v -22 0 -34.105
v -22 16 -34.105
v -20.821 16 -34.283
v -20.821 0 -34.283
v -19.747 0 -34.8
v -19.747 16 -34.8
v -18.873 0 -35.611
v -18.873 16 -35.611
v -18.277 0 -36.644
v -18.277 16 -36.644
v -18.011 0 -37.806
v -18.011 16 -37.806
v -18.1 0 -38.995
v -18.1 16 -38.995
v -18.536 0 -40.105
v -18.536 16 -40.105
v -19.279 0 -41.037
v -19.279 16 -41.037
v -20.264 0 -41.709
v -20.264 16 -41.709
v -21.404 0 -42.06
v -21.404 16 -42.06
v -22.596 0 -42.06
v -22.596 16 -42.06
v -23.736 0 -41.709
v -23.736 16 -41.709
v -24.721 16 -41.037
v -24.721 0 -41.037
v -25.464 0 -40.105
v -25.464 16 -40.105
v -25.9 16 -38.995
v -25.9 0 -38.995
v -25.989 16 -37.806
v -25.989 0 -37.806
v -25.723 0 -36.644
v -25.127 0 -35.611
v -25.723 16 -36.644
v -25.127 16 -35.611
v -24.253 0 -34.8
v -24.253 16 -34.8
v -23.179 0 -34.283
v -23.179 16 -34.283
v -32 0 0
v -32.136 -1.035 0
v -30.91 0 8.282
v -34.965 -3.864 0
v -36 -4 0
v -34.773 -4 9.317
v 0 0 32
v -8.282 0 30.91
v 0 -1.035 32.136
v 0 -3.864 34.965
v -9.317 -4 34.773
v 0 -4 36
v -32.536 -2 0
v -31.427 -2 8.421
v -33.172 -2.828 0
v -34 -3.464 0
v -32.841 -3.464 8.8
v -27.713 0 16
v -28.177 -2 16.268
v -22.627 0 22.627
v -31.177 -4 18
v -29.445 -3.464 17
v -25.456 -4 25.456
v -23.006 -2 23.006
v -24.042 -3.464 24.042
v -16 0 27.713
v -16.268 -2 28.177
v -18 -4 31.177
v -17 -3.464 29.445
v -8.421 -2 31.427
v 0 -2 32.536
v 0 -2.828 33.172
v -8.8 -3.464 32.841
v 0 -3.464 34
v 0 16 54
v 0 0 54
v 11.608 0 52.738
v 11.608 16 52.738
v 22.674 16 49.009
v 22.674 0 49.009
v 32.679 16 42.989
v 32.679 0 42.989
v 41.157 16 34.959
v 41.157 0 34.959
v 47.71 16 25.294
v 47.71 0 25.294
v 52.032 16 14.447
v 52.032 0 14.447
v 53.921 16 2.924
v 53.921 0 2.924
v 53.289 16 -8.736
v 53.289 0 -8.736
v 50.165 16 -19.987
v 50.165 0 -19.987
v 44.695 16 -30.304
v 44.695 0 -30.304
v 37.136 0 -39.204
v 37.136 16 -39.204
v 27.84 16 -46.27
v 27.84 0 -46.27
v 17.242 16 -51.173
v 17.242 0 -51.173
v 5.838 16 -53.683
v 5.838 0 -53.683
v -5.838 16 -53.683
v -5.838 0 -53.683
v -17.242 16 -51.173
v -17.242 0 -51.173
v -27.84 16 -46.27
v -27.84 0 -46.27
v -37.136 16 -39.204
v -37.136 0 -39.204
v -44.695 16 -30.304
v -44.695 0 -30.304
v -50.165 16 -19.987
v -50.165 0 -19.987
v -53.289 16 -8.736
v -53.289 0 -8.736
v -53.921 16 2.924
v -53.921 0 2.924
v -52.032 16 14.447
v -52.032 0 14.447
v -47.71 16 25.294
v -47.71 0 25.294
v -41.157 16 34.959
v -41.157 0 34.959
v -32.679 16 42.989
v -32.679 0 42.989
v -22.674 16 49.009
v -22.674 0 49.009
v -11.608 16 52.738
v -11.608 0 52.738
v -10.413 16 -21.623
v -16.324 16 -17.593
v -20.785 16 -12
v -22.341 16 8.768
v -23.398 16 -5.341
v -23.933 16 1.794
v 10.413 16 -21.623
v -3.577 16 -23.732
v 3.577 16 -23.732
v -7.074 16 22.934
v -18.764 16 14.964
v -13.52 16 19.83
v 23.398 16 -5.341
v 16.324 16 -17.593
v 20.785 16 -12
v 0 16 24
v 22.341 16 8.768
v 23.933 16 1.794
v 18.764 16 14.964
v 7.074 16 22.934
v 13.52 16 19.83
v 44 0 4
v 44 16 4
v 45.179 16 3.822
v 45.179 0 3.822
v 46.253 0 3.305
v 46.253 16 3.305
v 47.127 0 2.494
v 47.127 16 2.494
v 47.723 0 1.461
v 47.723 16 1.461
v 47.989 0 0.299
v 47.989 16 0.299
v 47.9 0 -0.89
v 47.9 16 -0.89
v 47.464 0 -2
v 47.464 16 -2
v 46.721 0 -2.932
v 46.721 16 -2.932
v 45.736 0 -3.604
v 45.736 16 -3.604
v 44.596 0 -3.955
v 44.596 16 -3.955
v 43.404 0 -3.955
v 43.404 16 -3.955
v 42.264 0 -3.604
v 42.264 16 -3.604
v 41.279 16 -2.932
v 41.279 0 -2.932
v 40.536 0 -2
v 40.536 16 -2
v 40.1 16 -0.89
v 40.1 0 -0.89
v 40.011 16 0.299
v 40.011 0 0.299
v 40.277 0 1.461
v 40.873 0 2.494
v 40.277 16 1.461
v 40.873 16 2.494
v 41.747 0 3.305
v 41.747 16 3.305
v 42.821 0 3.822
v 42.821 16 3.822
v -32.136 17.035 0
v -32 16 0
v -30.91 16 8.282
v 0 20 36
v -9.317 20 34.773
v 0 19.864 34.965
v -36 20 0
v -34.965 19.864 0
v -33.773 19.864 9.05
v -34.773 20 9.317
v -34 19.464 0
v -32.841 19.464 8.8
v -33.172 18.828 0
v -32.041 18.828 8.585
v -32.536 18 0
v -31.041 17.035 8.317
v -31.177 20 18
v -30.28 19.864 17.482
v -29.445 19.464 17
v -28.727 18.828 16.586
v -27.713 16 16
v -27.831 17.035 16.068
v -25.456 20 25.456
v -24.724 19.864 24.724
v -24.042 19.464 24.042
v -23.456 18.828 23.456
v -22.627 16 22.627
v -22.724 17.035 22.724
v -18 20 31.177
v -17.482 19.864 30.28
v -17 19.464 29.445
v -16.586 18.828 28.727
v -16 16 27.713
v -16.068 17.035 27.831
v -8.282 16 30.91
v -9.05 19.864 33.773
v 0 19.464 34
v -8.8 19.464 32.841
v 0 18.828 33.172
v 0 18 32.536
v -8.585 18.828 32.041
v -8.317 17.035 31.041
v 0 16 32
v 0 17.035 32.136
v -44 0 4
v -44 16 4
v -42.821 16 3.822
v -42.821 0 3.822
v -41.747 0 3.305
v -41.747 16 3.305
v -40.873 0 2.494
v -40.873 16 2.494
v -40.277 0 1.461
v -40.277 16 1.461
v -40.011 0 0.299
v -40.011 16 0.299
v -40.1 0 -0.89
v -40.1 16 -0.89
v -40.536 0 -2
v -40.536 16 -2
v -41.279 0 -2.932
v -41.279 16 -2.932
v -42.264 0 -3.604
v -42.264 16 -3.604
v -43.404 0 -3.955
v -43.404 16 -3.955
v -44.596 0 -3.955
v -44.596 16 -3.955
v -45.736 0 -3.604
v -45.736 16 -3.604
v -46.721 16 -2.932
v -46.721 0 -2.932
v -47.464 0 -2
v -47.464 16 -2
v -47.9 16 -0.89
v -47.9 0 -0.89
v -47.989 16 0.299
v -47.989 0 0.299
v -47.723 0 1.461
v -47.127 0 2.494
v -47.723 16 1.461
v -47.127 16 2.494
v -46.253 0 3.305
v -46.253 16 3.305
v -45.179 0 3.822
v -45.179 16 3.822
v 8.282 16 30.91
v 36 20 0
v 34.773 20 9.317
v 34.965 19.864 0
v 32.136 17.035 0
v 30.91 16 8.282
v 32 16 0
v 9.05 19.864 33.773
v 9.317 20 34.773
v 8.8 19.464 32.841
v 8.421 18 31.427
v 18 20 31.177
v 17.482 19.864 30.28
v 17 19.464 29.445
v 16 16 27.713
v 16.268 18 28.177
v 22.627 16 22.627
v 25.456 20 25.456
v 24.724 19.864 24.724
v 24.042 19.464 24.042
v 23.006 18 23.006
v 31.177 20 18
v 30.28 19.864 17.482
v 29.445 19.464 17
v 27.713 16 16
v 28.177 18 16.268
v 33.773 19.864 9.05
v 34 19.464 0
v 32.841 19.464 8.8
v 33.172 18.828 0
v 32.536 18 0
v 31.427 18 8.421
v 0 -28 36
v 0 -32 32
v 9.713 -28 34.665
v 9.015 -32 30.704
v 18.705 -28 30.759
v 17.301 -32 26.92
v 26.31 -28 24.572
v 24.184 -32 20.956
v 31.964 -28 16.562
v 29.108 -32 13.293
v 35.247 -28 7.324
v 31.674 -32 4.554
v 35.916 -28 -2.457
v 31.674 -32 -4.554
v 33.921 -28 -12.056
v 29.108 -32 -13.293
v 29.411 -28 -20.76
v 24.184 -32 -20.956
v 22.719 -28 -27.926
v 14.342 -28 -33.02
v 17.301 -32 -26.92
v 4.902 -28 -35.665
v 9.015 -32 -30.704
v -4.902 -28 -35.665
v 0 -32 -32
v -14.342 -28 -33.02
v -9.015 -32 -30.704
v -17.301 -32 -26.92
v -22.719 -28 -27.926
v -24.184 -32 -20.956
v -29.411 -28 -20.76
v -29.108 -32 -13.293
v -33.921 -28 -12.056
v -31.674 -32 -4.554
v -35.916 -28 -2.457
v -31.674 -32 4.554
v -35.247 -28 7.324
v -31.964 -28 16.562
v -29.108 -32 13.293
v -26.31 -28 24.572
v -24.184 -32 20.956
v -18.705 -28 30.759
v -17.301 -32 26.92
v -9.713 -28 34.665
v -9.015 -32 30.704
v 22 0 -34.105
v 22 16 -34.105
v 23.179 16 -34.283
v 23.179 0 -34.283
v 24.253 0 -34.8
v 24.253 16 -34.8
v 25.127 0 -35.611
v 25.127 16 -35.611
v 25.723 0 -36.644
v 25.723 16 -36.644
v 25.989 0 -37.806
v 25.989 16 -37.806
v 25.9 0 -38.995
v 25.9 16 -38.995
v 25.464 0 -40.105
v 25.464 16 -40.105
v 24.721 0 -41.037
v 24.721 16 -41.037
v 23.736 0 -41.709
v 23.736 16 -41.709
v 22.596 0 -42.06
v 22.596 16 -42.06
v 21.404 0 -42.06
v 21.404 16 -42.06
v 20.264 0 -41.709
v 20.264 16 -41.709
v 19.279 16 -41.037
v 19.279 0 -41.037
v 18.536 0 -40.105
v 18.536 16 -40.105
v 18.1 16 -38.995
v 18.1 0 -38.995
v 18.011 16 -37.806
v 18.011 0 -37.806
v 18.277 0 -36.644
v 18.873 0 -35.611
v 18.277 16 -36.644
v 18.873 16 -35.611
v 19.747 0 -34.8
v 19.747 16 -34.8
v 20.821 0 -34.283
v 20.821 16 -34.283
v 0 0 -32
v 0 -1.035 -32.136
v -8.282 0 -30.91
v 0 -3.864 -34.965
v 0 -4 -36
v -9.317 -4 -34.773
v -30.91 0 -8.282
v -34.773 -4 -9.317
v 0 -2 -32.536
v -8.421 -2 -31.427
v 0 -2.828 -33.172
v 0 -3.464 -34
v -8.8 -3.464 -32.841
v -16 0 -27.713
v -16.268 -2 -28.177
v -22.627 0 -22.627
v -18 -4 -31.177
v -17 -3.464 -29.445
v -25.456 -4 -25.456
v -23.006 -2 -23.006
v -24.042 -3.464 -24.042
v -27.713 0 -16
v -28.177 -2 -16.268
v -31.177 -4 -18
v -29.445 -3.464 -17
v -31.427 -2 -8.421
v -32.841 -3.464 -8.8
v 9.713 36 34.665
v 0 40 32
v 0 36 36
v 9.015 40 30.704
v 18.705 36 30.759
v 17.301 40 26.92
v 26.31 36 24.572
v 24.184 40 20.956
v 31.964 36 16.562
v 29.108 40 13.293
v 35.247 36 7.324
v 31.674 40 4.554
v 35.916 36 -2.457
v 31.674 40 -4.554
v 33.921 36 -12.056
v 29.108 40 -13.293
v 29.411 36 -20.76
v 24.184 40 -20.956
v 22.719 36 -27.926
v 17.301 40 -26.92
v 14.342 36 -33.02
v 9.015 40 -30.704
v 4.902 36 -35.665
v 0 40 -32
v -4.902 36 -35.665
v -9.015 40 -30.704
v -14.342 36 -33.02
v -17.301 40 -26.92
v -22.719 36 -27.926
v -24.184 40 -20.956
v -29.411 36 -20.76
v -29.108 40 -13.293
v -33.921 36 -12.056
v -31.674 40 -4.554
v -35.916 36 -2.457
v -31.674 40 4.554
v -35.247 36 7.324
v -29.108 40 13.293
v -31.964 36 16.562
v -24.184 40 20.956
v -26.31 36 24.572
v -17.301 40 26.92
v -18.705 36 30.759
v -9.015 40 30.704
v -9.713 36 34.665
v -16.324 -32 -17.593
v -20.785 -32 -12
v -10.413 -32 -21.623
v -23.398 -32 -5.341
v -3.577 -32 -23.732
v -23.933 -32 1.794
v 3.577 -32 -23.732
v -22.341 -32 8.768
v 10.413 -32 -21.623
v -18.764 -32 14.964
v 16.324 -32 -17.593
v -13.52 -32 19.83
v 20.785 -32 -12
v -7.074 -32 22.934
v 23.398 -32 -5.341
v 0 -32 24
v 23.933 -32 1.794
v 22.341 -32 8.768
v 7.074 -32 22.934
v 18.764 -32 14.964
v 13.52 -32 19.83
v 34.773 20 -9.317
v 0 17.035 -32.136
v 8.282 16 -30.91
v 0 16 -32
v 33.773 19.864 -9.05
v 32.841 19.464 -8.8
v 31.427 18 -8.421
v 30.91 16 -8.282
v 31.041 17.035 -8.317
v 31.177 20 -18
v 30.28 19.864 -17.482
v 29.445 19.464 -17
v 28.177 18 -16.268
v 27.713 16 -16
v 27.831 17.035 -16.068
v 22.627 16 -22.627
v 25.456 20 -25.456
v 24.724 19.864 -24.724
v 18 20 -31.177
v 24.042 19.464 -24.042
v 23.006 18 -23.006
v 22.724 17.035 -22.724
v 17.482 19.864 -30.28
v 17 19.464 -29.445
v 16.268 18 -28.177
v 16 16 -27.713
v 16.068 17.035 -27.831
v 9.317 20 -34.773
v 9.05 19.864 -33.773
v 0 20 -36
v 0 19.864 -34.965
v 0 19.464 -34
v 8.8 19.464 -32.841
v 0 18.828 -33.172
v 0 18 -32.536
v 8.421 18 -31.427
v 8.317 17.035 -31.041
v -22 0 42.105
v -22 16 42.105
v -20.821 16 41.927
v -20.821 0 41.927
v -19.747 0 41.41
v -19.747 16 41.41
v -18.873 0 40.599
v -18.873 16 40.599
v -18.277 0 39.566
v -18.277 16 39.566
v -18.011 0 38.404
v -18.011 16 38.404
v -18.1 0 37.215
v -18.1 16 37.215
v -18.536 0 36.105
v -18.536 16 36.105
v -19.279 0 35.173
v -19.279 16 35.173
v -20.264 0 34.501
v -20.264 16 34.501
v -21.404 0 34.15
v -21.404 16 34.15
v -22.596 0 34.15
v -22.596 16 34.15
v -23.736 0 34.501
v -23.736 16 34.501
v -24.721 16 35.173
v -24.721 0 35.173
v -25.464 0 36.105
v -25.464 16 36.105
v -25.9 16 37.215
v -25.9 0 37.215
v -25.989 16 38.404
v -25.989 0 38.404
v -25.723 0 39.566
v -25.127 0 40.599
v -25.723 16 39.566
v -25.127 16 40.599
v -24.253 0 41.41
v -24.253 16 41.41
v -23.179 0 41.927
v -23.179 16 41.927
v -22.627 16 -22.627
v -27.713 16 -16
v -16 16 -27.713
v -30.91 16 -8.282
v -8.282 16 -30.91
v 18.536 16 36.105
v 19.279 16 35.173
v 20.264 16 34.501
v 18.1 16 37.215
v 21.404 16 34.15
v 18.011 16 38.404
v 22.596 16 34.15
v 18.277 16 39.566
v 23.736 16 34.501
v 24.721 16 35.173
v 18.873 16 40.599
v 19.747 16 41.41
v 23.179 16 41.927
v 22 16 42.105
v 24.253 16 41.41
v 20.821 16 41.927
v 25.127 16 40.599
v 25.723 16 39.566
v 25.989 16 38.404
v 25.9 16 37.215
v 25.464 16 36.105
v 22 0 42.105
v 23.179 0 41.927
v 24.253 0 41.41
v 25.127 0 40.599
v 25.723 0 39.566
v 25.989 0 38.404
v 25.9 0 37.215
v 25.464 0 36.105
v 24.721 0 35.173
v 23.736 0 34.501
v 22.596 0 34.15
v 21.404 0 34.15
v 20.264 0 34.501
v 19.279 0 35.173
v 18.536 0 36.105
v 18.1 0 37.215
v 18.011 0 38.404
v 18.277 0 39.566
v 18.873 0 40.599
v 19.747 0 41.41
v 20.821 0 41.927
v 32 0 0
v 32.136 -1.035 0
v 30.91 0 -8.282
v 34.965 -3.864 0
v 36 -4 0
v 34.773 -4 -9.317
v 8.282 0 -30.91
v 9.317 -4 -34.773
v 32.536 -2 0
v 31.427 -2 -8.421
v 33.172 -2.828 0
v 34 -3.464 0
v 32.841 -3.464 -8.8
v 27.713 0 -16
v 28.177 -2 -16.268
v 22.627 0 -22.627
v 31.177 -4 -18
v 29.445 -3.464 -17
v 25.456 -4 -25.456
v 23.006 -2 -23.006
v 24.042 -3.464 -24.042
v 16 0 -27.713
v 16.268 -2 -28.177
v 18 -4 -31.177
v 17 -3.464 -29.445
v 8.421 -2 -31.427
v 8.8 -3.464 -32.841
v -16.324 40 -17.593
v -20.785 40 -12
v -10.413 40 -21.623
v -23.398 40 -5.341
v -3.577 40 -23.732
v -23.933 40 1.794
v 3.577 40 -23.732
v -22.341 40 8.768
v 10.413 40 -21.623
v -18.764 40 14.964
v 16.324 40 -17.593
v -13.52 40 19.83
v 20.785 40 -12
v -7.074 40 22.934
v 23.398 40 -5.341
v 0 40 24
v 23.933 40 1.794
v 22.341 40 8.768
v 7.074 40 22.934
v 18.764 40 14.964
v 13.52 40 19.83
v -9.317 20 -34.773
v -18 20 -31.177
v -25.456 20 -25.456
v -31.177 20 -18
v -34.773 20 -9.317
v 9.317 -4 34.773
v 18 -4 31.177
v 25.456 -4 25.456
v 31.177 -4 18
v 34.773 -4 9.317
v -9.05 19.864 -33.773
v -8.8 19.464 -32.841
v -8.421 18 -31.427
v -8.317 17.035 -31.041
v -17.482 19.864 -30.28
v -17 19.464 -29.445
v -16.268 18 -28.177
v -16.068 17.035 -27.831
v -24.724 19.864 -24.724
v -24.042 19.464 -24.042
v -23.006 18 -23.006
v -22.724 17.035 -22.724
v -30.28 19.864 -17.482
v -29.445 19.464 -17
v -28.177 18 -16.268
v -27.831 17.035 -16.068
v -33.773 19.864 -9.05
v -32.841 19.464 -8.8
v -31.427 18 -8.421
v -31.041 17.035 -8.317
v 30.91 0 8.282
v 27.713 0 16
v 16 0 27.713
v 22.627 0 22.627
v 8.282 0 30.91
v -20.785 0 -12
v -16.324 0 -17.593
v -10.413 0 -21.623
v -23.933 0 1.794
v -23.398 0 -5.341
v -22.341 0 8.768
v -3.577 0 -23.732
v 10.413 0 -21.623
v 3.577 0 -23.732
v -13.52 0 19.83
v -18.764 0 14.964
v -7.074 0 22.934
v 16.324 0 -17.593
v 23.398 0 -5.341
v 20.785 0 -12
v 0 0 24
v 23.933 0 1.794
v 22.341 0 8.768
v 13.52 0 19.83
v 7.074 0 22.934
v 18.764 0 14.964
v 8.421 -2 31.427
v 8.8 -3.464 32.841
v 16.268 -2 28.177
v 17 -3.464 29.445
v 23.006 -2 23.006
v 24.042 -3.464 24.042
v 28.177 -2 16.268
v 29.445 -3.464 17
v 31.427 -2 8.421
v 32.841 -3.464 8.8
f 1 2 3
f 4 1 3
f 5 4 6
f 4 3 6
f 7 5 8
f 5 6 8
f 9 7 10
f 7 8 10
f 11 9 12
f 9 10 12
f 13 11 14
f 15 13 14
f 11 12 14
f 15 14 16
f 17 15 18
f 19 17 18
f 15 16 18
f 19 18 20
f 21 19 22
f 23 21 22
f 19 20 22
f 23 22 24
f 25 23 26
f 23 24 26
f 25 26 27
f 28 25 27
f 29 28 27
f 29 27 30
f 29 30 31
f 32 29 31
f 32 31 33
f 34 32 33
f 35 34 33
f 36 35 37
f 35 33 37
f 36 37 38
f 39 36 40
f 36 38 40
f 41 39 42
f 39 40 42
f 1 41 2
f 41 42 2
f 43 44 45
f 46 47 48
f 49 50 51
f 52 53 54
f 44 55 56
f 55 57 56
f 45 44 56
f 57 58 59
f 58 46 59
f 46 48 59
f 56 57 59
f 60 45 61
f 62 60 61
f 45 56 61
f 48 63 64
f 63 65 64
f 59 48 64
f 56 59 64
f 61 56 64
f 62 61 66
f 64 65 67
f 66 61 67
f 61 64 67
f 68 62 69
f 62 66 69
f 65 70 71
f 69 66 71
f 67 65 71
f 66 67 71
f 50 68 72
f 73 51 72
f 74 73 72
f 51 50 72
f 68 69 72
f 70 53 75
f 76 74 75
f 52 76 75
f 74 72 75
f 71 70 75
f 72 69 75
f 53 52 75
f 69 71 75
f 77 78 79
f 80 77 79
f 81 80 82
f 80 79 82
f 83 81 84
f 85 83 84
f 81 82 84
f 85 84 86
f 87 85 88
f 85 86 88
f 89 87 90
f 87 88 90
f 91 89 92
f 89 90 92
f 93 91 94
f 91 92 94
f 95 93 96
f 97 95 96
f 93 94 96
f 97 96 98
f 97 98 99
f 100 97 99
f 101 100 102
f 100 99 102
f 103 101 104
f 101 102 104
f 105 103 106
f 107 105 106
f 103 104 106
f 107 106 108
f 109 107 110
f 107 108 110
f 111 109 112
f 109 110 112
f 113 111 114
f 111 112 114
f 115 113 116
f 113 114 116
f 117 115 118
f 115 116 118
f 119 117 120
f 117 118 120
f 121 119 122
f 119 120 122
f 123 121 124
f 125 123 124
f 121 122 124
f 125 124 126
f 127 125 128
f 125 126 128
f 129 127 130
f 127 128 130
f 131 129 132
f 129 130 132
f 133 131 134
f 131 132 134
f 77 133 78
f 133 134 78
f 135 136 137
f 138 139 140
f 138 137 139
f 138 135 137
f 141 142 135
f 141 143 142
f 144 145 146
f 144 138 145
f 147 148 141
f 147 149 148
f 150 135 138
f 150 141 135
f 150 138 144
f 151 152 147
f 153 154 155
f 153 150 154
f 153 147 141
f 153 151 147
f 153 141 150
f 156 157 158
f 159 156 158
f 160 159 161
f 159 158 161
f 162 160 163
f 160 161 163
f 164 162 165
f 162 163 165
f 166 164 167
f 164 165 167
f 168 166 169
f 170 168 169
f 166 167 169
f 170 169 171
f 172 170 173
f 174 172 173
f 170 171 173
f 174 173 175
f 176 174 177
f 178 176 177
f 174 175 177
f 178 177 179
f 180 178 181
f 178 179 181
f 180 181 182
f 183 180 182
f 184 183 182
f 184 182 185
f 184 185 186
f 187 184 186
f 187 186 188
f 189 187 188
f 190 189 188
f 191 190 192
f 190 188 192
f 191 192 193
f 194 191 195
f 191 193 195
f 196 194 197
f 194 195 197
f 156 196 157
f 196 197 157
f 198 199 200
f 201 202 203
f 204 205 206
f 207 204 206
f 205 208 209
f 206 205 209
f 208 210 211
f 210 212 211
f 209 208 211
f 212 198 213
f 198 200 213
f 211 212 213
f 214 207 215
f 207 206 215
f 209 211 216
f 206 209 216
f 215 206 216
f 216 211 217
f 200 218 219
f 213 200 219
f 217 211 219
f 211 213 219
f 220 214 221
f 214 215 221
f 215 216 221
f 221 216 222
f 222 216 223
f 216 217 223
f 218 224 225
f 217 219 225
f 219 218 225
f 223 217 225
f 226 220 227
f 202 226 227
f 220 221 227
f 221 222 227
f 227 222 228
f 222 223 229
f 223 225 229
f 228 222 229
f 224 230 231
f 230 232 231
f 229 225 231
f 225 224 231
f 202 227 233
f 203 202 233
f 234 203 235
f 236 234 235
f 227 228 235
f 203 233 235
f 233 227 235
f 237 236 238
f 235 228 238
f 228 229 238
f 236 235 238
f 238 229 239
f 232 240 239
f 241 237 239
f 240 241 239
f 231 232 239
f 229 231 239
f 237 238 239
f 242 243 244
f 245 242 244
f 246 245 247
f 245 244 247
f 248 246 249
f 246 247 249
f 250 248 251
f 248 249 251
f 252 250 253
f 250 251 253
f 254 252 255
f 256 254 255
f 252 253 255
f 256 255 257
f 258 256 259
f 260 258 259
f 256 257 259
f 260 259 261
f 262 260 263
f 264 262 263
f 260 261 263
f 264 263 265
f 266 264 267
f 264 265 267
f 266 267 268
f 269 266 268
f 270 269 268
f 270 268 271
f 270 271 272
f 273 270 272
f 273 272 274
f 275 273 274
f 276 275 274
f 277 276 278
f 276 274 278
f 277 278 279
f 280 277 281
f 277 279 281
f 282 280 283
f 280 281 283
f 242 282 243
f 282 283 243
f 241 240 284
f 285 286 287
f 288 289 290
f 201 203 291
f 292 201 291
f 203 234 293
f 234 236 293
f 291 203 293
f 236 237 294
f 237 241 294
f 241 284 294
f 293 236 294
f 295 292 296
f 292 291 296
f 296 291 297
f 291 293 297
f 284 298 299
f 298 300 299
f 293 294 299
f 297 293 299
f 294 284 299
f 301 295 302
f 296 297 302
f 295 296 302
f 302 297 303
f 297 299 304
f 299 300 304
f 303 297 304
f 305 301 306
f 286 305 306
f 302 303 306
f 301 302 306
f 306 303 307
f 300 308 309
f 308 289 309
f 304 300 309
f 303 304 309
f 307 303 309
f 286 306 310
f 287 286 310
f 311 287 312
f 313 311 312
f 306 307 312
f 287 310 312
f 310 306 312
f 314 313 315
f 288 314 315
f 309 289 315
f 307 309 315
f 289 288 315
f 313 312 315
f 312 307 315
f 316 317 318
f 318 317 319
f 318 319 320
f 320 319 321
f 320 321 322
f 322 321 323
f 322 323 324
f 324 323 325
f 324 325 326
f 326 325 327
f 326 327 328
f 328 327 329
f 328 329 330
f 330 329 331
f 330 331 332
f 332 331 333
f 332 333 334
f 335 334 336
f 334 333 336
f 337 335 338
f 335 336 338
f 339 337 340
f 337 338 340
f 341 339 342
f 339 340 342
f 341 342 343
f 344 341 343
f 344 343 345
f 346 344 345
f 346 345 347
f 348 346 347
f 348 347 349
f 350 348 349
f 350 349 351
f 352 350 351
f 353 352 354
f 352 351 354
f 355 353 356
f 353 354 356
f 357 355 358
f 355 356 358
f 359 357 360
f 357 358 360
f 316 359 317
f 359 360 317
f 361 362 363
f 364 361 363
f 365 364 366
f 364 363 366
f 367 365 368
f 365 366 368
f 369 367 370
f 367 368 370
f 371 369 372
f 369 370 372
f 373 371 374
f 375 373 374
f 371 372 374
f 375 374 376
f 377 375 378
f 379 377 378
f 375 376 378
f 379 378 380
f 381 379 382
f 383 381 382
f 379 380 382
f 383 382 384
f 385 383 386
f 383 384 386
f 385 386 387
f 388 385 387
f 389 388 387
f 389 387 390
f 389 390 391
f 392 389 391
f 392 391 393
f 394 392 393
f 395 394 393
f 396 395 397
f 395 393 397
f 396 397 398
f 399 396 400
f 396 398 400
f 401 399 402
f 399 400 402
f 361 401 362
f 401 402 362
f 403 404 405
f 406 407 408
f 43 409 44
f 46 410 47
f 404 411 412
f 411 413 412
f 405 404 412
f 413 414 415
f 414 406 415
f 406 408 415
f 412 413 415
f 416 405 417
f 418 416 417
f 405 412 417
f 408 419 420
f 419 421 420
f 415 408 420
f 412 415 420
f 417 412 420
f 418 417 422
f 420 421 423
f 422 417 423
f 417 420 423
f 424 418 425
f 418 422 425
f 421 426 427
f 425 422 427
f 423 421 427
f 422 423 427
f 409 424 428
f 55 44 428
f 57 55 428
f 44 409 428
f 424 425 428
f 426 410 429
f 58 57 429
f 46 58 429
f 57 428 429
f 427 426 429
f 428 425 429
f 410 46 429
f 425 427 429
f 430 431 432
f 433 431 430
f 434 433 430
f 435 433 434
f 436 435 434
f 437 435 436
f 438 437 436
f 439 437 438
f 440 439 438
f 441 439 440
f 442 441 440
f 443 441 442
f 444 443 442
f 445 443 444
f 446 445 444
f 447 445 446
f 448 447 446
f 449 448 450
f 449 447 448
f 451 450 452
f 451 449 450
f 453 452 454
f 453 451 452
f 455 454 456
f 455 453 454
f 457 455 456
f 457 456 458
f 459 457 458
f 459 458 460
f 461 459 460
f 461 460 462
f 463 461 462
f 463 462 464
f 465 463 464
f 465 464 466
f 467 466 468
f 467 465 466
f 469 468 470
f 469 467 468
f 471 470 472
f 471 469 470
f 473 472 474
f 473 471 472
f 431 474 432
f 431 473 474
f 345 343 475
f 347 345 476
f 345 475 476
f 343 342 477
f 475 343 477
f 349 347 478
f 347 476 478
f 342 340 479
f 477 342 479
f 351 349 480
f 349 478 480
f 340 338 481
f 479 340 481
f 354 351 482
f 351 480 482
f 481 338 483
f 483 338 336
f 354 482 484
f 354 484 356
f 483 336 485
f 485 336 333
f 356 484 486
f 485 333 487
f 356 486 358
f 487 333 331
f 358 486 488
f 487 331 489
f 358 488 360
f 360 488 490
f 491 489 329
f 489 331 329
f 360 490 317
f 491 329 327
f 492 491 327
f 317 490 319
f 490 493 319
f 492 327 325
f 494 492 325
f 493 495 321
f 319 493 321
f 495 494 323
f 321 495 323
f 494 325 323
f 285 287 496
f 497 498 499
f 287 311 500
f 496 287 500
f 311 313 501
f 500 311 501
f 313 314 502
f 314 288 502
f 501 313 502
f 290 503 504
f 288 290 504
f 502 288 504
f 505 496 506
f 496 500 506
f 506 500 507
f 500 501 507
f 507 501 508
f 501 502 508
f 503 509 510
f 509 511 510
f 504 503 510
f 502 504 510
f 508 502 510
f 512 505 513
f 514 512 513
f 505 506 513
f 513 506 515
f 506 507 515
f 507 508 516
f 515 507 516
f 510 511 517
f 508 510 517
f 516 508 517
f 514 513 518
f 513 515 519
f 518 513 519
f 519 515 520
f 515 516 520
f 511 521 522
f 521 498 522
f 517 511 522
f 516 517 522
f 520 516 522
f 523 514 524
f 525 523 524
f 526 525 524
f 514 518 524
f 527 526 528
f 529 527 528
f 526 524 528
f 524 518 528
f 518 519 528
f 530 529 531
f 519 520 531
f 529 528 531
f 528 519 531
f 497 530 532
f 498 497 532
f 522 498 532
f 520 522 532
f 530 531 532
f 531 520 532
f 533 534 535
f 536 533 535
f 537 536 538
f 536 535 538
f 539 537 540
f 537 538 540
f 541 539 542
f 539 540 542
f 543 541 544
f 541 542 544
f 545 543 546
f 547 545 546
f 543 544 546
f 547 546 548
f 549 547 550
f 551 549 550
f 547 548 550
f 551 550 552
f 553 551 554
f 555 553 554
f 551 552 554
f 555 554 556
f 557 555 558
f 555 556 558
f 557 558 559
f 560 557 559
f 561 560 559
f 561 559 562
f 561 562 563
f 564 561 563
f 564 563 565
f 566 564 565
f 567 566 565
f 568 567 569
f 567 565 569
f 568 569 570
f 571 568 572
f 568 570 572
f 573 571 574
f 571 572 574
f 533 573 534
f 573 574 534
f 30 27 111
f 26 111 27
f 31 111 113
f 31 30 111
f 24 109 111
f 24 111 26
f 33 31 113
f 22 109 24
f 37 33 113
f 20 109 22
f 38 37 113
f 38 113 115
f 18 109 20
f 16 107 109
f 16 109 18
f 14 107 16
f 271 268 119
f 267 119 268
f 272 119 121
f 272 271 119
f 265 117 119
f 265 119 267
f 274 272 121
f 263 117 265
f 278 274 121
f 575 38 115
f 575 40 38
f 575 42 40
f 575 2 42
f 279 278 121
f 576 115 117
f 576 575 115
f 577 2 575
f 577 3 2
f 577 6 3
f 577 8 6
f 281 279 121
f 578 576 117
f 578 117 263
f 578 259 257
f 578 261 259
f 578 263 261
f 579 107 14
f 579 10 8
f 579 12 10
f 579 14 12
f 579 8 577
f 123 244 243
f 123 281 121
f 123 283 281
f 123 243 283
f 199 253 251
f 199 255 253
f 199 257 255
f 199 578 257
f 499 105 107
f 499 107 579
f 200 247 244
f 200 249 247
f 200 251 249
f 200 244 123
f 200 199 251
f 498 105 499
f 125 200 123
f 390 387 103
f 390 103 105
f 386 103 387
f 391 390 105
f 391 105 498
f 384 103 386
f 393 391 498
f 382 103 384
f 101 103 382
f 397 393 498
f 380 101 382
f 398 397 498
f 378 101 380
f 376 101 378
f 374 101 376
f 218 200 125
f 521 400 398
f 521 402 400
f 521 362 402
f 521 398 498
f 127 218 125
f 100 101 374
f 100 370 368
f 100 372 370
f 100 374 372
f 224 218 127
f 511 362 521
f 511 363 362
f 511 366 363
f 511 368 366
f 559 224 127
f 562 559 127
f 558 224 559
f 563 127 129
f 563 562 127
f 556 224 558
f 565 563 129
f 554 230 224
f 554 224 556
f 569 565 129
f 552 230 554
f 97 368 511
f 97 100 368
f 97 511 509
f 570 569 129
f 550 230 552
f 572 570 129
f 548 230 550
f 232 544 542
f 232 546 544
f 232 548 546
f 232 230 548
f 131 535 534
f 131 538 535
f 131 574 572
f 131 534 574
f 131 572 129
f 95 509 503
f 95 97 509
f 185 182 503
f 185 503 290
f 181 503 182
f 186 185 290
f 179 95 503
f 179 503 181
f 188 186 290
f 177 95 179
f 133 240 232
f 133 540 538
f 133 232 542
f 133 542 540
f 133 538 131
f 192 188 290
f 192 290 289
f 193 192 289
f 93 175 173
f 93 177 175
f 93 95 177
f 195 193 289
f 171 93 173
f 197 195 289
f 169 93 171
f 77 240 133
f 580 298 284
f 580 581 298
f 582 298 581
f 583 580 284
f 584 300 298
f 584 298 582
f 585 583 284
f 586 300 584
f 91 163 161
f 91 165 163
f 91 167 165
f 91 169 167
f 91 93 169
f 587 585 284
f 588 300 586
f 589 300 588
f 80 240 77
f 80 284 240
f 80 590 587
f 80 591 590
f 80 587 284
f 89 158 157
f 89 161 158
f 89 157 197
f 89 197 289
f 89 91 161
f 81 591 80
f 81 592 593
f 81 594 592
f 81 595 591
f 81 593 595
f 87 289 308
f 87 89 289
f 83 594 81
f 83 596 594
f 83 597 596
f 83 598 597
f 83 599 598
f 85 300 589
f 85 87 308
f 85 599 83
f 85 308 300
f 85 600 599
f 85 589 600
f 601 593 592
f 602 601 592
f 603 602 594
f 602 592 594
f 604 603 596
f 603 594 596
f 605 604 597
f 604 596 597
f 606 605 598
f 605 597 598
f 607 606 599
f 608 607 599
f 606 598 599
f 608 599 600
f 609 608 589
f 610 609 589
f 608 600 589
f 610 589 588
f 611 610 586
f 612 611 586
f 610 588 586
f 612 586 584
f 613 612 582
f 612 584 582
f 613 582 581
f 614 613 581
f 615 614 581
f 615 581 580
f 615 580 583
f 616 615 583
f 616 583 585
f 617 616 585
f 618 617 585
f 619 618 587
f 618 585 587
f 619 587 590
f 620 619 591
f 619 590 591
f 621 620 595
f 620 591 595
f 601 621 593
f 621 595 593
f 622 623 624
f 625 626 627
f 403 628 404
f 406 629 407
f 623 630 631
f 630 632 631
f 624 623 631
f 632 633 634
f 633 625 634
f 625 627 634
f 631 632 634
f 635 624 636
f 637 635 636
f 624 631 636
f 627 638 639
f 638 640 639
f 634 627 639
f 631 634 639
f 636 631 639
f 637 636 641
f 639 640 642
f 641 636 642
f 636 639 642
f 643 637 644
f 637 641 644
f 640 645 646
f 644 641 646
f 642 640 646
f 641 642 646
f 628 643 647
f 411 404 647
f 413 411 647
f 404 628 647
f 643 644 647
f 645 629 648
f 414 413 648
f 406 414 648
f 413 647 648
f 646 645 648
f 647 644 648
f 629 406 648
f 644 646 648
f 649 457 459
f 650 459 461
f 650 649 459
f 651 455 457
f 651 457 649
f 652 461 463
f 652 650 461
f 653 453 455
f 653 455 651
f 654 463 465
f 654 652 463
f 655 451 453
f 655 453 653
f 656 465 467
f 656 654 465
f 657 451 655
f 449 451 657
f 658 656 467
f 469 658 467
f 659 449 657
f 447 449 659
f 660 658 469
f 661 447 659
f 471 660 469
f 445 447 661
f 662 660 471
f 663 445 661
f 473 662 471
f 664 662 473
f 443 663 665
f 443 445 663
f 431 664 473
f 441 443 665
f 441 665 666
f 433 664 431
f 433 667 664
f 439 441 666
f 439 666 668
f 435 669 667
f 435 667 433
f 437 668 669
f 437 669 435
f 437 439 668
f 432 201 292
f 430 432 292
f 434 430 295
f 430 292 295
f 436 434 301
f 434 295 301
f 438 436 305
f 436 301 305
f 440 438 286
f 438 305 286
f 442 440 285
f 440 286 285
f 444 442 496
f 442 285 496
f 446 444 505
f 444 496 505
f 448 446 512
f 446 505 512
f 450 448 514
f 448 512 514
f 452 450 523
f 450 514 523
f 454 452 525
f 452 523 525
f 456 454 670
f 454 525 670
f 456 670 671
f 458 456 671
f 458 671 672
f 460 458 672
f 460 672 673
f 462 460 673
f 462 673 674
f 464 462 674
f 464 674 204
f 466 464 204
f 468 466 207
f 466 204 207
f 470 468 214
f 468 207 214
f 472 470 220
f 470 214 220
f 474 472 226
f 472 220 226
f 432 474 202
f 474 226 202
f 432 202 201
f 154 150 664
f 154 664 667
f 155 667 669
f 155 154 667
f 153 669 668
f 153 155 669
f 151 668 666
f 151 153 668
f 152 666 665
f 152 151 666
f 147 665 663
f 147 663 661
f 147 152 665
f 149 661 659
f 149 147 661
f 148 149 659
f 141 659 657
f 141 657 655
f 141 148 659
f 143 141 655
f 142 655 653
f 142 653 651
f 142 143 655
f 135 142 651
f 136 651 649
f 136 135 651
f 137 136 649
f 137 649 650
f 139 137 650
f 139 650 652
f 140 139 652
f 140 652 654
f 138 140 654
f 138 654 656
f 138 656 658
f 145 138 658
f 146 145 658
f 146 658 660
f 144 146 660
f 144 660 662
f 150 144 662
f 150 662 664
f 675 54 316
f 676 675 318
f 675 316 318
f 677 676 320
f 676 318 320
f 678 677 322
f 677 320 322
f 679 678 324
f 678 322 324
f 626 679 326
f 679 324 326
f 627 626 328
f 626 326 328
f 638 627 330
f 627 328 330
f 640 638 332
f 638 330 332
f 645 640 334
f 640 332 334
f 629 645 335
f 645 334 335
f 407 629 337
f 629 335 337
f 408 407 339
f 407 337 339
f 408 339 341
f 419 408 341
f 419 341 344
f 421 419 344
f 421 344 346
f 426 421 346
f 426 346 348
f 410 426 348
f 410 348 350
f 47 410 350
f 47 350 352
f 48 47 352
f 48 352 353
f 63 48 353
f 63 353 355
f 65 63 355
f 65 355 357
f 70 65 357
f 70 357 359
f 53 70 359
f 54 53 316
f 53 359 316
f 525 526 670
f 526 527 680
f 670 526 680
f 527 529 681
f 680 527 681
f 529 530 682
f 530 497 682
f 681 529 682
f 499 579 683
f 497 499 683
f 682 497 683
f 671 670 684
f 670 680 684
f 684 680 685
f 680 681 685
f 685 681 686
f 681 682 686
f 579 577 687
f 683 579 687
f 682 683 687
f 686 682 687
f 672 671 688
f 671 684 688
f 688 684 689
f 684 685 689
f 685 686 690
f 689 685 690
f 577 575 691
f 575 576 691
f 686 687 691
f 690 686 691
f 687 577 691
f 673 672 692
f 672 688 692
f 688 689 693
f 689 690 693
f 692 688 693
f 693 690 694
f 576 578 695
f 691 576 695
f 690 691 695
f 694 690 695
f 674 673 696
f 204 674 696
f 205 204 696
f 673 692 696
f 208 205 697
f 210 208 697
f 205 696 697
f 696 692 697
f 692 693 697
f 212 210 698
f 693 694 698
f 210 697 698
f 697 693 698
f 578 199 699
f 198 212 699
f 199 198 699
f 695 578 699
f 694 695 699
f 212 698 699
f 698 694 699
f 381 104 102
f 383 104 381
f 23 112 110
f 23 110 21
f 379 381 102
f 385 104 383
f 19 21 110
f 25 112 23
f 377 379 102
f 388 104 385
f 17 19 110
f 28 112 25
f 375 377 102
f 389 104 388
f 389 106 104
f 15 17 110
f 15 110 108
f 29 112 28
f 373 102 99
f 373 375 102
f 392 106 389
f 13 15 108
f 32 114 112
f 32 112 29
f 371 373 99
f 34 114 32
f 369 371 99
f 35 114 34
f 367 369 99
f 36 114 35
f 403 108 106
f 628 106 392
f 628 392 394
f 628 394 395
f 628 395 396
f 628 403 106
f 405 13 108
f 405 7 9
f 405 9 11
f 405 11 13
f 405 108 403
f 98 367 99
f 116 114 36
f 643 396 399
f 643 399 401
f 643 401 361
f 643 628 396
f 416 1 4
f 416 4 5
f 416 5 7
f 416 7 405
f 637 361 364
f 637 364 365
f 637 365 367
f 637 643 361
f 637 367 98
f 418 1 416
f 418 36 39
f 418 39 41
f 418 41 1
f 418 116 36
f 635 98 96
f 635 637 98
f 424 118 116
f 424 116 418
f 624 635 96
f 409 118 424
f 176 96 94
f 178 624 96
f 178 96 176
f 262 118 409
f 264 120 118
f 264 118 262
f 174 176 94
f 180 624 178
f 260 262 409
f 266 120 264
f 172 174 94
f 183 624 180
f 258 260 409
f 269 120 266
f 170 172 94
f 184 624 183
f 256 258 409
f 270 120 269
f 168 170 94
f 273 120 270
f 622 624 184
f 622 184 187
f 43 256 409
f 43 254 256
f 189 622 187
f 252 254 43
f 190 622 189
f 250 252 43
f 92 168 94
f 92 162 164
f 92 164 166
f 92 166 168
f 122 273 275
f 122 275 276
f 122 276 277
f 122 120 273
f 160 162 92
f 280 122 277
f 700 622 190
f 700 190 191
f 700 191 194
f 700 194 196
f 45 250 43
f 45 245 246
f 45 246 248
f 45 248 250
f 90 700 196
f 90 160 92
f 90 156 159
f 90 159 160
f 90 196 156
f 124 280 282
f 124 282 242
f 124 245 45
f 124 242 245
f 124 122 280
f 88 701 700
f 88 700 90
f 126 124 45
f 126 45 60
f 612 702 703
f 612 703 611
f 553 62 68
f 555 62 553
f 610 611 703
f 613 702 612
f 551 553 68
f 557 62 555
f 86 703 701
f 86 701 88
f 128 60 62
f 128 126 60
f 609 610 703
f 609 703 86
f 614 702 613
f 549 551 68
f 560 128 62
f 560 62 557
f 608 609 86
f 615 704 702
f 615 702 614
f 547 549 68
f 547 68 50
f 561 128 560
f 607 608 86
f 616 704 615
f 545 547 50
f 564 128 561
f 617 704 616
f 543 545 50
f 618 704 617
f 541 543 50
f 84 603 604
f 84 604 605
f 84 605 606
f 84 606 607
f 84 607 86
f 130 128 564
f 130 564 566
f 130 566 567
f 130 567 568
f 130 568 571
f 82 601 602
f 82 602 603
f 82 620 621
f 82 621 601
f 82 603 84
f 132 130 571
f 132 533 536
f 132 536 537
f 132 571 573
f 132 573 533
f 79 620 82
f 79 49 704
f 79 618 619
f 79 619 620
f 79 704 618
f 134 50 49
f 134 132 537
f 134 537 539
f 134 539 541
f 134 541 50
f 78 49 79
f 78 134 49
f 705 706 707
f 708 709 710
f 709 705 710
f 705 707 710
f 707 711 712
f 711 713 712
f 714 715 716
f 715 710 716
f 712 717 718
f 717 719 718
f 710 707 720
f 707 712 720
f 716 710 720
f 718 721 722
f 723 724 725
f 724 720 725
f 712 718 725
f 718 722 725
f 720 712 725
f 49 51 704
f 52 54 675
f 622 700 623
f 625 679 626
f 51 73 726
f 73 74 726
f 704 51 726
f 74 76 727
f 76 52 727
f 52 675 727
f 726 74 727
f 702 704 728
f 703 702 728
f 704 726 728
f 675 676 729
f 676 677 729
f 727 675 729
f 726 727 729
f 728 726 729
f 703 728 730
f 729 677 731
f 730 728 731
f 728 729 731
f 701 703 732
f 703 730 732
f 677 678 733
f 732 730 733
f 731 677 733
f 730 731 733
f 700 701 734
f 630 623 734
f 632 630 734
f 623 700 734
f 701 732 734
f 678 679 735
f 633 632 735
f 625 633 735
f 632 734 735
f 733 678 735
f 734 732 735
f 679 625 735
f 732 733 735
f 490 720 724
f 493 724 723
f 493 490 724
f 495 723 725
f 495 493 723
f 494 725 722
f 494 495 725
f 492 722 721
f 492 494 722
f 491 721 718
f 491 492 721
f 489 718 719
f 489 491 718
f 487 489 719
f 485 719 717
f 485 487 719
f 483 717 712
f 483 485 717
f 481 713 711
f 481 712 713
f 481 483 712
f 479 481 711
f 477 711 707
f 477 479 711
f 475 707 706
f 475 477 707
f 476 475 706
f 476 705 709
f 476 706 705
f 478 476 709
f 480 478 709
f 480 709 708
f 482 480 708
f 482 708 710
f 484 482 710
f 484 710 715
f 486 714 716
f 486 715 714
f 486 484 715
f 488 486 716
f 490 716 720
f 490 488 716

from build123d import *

# Parameters (mm, degrees)
Y_KSEKLIK_EKSTR_ZYON1_DEPTH      = 40
Y_KSEKLIK_EKSTR_ZYON1_DEPTH_BACK = 32
IZIM1_R                          = 36
IZIM1_R_2                        = 24
IZIM1_3_R                        = 54
Y_KSEKLIK_EKSTR_ZYON2_DEPTH      = 16
PAH1_SIZE                        = 4
PAH3_SIZE                        = 4
IZIM6_R                          = 4
KES_EKSTR_ZYON1_DEPTH            = 16


with BuildPart() as part:
    # Çizim1 → Yükseklik-Ekstrüzyon1 (new, two sides: drawn at the far end of the back side and taken through both)
    with BuildSketch(Plane(origin=(0, 0, 0), x_dir=(1, 0, 0), z_dir=(0, 1, 0)).offset(-Y_KSEKLIK_EKSTR_ZYON1_DEPTH_BACK)):
        Circle(IZIM1_R)
        Circle(IZIM1_R_2, mode=Mode.SUBTRACT)
    extrude(amount=Y_KSEKLIK_EKSTR_ZYON1_DEPTH + Y_KSEKLIK_EKSTR_ZYON1_DEPTH_BACK)

    # Çizim1<3> → Yükseklik-Ekstrüzyon2 (add)
    with BuildSketch(Plane(origin=(0, 0, 0), x_dir=(1, 0, 0), z_dir=(0, 1, 0))):
        Circle(IZIM1_3_R)
    extrude(amount=Y_KSEKLIK_EKSTR_ZYON2_DEPTH)

    # Pah1
    pah1_edges = [part.edges().sort_by_distance(p)[0] for p in [
        (-36, 40, 0),
    ]]
    chamfer(pah1_edges, length=PAH1_SIZE)

    # Pah3
    pah3_edges = [part.edges().sort_by_distance(p)[0] for p in [
        (-36, -32, 0),
    ]]
    chamfer(pah3_edges, length=PAH3_SIZE)

    # Kes-Süpür1: sweep along a curve in space
    with BuildLine() as kes_s_p_r1_path:
        ThreePointArc((0, 16, 36), (25.455844123, 16, 25.455844123), (36, 16, 0))
        ThreePointArc((36, 16, 0), (25.455844123, 16, -25.455844123), (0, 16, -36))
        ThreePointArc((0, 16, -36), (-25.455844123, 16, -25.455844123), (-36, 16, 0))
        ThreePointArc((-36, 16, 0), (-25.455844123, 16, 25.455844123), (0, 16, 36))
    # Çizim4 → Kes-Süpür1 (sweep, cut)
    with BuildSketch(Plane(origin=(0, 0, 0), x_dir=(0, 0, -1), z_dir=(1, 0, 0))):
        with BuildLine():
            Line((-36, 20), (-36, 16))
            Line((-36, 16), (-32, 16))
            ThreePointArc((-32, 16), (-33.171572875, 18.828427125), (-36, 20))
        make_face()
    sweep(path=kes_s_p_r1_path.line, mode=Mode.SUBTRACT)

    # Kes-Süpür3: sweep along a curve in space
    with BuildLine() as kes_s_p_r3_path:
        ThreePointArc((0, 0, 36), (25.455844123, 0, 25.455844123), (36, 0, 0))
        ThreePointArc((36, 0, 0), (25.455844123, 0, -25.455844123), (0, 0, -36))
        ThreePointArc((0, 0, -36), (-25.455844123, 0, -25.455844123), (-36, 0, 0))
        ThreePointArc((-36, 0, 0), (-25.455844123, 0, 25.455844123), (0, 0, 36))
    # Çizim5 → Kes-Süpür3 (sweep, cut)
    with BuildSketch(Plane(origin=(0, 0, 0), x_dir=(0, 0, -1), z_dir=(1, 0, 0))):
        with BuildLine():
            Line((-36, 0), (-36, -4))
            ThreePointArc((-36, -4), (-33.171572875, -2.828427125), (-32, 0))
            Line((-32, 0), (-36, 0))
        make_face()
    sweep(path=kes_s_p_r3_path.line, mode=Mode.SUBTRACT)

    # Çizim6 → Kes-Ekstrüzyon1 (cut)
    with BuildSketch(Plane(origin=(0, 16, 0), x_dir=(1, 0, 0), z_dir=(0, 1, 0))):
        with Locations((-22, 38.105117767)):
            Circle(IZIM6_R)
        with Locations((22, 38.105117767)):
            Circle(IZIM6_R)
        with Locations((44, 0)):
            Circle(IZIM6_R)
        with Locations((22, -38.105117767)):
            Circle(IZIM6_R)
        with Locations((-22, -38.105117767)):
            Circle(IZIM6_R)
        with Locations((-44, 0)):
            Circle(IZIM6_R)
    extrude(amount=-KES_EKSTR_ZYON1_DEPTH, mode=Mode.SUBTRACT)


solid = part.part
